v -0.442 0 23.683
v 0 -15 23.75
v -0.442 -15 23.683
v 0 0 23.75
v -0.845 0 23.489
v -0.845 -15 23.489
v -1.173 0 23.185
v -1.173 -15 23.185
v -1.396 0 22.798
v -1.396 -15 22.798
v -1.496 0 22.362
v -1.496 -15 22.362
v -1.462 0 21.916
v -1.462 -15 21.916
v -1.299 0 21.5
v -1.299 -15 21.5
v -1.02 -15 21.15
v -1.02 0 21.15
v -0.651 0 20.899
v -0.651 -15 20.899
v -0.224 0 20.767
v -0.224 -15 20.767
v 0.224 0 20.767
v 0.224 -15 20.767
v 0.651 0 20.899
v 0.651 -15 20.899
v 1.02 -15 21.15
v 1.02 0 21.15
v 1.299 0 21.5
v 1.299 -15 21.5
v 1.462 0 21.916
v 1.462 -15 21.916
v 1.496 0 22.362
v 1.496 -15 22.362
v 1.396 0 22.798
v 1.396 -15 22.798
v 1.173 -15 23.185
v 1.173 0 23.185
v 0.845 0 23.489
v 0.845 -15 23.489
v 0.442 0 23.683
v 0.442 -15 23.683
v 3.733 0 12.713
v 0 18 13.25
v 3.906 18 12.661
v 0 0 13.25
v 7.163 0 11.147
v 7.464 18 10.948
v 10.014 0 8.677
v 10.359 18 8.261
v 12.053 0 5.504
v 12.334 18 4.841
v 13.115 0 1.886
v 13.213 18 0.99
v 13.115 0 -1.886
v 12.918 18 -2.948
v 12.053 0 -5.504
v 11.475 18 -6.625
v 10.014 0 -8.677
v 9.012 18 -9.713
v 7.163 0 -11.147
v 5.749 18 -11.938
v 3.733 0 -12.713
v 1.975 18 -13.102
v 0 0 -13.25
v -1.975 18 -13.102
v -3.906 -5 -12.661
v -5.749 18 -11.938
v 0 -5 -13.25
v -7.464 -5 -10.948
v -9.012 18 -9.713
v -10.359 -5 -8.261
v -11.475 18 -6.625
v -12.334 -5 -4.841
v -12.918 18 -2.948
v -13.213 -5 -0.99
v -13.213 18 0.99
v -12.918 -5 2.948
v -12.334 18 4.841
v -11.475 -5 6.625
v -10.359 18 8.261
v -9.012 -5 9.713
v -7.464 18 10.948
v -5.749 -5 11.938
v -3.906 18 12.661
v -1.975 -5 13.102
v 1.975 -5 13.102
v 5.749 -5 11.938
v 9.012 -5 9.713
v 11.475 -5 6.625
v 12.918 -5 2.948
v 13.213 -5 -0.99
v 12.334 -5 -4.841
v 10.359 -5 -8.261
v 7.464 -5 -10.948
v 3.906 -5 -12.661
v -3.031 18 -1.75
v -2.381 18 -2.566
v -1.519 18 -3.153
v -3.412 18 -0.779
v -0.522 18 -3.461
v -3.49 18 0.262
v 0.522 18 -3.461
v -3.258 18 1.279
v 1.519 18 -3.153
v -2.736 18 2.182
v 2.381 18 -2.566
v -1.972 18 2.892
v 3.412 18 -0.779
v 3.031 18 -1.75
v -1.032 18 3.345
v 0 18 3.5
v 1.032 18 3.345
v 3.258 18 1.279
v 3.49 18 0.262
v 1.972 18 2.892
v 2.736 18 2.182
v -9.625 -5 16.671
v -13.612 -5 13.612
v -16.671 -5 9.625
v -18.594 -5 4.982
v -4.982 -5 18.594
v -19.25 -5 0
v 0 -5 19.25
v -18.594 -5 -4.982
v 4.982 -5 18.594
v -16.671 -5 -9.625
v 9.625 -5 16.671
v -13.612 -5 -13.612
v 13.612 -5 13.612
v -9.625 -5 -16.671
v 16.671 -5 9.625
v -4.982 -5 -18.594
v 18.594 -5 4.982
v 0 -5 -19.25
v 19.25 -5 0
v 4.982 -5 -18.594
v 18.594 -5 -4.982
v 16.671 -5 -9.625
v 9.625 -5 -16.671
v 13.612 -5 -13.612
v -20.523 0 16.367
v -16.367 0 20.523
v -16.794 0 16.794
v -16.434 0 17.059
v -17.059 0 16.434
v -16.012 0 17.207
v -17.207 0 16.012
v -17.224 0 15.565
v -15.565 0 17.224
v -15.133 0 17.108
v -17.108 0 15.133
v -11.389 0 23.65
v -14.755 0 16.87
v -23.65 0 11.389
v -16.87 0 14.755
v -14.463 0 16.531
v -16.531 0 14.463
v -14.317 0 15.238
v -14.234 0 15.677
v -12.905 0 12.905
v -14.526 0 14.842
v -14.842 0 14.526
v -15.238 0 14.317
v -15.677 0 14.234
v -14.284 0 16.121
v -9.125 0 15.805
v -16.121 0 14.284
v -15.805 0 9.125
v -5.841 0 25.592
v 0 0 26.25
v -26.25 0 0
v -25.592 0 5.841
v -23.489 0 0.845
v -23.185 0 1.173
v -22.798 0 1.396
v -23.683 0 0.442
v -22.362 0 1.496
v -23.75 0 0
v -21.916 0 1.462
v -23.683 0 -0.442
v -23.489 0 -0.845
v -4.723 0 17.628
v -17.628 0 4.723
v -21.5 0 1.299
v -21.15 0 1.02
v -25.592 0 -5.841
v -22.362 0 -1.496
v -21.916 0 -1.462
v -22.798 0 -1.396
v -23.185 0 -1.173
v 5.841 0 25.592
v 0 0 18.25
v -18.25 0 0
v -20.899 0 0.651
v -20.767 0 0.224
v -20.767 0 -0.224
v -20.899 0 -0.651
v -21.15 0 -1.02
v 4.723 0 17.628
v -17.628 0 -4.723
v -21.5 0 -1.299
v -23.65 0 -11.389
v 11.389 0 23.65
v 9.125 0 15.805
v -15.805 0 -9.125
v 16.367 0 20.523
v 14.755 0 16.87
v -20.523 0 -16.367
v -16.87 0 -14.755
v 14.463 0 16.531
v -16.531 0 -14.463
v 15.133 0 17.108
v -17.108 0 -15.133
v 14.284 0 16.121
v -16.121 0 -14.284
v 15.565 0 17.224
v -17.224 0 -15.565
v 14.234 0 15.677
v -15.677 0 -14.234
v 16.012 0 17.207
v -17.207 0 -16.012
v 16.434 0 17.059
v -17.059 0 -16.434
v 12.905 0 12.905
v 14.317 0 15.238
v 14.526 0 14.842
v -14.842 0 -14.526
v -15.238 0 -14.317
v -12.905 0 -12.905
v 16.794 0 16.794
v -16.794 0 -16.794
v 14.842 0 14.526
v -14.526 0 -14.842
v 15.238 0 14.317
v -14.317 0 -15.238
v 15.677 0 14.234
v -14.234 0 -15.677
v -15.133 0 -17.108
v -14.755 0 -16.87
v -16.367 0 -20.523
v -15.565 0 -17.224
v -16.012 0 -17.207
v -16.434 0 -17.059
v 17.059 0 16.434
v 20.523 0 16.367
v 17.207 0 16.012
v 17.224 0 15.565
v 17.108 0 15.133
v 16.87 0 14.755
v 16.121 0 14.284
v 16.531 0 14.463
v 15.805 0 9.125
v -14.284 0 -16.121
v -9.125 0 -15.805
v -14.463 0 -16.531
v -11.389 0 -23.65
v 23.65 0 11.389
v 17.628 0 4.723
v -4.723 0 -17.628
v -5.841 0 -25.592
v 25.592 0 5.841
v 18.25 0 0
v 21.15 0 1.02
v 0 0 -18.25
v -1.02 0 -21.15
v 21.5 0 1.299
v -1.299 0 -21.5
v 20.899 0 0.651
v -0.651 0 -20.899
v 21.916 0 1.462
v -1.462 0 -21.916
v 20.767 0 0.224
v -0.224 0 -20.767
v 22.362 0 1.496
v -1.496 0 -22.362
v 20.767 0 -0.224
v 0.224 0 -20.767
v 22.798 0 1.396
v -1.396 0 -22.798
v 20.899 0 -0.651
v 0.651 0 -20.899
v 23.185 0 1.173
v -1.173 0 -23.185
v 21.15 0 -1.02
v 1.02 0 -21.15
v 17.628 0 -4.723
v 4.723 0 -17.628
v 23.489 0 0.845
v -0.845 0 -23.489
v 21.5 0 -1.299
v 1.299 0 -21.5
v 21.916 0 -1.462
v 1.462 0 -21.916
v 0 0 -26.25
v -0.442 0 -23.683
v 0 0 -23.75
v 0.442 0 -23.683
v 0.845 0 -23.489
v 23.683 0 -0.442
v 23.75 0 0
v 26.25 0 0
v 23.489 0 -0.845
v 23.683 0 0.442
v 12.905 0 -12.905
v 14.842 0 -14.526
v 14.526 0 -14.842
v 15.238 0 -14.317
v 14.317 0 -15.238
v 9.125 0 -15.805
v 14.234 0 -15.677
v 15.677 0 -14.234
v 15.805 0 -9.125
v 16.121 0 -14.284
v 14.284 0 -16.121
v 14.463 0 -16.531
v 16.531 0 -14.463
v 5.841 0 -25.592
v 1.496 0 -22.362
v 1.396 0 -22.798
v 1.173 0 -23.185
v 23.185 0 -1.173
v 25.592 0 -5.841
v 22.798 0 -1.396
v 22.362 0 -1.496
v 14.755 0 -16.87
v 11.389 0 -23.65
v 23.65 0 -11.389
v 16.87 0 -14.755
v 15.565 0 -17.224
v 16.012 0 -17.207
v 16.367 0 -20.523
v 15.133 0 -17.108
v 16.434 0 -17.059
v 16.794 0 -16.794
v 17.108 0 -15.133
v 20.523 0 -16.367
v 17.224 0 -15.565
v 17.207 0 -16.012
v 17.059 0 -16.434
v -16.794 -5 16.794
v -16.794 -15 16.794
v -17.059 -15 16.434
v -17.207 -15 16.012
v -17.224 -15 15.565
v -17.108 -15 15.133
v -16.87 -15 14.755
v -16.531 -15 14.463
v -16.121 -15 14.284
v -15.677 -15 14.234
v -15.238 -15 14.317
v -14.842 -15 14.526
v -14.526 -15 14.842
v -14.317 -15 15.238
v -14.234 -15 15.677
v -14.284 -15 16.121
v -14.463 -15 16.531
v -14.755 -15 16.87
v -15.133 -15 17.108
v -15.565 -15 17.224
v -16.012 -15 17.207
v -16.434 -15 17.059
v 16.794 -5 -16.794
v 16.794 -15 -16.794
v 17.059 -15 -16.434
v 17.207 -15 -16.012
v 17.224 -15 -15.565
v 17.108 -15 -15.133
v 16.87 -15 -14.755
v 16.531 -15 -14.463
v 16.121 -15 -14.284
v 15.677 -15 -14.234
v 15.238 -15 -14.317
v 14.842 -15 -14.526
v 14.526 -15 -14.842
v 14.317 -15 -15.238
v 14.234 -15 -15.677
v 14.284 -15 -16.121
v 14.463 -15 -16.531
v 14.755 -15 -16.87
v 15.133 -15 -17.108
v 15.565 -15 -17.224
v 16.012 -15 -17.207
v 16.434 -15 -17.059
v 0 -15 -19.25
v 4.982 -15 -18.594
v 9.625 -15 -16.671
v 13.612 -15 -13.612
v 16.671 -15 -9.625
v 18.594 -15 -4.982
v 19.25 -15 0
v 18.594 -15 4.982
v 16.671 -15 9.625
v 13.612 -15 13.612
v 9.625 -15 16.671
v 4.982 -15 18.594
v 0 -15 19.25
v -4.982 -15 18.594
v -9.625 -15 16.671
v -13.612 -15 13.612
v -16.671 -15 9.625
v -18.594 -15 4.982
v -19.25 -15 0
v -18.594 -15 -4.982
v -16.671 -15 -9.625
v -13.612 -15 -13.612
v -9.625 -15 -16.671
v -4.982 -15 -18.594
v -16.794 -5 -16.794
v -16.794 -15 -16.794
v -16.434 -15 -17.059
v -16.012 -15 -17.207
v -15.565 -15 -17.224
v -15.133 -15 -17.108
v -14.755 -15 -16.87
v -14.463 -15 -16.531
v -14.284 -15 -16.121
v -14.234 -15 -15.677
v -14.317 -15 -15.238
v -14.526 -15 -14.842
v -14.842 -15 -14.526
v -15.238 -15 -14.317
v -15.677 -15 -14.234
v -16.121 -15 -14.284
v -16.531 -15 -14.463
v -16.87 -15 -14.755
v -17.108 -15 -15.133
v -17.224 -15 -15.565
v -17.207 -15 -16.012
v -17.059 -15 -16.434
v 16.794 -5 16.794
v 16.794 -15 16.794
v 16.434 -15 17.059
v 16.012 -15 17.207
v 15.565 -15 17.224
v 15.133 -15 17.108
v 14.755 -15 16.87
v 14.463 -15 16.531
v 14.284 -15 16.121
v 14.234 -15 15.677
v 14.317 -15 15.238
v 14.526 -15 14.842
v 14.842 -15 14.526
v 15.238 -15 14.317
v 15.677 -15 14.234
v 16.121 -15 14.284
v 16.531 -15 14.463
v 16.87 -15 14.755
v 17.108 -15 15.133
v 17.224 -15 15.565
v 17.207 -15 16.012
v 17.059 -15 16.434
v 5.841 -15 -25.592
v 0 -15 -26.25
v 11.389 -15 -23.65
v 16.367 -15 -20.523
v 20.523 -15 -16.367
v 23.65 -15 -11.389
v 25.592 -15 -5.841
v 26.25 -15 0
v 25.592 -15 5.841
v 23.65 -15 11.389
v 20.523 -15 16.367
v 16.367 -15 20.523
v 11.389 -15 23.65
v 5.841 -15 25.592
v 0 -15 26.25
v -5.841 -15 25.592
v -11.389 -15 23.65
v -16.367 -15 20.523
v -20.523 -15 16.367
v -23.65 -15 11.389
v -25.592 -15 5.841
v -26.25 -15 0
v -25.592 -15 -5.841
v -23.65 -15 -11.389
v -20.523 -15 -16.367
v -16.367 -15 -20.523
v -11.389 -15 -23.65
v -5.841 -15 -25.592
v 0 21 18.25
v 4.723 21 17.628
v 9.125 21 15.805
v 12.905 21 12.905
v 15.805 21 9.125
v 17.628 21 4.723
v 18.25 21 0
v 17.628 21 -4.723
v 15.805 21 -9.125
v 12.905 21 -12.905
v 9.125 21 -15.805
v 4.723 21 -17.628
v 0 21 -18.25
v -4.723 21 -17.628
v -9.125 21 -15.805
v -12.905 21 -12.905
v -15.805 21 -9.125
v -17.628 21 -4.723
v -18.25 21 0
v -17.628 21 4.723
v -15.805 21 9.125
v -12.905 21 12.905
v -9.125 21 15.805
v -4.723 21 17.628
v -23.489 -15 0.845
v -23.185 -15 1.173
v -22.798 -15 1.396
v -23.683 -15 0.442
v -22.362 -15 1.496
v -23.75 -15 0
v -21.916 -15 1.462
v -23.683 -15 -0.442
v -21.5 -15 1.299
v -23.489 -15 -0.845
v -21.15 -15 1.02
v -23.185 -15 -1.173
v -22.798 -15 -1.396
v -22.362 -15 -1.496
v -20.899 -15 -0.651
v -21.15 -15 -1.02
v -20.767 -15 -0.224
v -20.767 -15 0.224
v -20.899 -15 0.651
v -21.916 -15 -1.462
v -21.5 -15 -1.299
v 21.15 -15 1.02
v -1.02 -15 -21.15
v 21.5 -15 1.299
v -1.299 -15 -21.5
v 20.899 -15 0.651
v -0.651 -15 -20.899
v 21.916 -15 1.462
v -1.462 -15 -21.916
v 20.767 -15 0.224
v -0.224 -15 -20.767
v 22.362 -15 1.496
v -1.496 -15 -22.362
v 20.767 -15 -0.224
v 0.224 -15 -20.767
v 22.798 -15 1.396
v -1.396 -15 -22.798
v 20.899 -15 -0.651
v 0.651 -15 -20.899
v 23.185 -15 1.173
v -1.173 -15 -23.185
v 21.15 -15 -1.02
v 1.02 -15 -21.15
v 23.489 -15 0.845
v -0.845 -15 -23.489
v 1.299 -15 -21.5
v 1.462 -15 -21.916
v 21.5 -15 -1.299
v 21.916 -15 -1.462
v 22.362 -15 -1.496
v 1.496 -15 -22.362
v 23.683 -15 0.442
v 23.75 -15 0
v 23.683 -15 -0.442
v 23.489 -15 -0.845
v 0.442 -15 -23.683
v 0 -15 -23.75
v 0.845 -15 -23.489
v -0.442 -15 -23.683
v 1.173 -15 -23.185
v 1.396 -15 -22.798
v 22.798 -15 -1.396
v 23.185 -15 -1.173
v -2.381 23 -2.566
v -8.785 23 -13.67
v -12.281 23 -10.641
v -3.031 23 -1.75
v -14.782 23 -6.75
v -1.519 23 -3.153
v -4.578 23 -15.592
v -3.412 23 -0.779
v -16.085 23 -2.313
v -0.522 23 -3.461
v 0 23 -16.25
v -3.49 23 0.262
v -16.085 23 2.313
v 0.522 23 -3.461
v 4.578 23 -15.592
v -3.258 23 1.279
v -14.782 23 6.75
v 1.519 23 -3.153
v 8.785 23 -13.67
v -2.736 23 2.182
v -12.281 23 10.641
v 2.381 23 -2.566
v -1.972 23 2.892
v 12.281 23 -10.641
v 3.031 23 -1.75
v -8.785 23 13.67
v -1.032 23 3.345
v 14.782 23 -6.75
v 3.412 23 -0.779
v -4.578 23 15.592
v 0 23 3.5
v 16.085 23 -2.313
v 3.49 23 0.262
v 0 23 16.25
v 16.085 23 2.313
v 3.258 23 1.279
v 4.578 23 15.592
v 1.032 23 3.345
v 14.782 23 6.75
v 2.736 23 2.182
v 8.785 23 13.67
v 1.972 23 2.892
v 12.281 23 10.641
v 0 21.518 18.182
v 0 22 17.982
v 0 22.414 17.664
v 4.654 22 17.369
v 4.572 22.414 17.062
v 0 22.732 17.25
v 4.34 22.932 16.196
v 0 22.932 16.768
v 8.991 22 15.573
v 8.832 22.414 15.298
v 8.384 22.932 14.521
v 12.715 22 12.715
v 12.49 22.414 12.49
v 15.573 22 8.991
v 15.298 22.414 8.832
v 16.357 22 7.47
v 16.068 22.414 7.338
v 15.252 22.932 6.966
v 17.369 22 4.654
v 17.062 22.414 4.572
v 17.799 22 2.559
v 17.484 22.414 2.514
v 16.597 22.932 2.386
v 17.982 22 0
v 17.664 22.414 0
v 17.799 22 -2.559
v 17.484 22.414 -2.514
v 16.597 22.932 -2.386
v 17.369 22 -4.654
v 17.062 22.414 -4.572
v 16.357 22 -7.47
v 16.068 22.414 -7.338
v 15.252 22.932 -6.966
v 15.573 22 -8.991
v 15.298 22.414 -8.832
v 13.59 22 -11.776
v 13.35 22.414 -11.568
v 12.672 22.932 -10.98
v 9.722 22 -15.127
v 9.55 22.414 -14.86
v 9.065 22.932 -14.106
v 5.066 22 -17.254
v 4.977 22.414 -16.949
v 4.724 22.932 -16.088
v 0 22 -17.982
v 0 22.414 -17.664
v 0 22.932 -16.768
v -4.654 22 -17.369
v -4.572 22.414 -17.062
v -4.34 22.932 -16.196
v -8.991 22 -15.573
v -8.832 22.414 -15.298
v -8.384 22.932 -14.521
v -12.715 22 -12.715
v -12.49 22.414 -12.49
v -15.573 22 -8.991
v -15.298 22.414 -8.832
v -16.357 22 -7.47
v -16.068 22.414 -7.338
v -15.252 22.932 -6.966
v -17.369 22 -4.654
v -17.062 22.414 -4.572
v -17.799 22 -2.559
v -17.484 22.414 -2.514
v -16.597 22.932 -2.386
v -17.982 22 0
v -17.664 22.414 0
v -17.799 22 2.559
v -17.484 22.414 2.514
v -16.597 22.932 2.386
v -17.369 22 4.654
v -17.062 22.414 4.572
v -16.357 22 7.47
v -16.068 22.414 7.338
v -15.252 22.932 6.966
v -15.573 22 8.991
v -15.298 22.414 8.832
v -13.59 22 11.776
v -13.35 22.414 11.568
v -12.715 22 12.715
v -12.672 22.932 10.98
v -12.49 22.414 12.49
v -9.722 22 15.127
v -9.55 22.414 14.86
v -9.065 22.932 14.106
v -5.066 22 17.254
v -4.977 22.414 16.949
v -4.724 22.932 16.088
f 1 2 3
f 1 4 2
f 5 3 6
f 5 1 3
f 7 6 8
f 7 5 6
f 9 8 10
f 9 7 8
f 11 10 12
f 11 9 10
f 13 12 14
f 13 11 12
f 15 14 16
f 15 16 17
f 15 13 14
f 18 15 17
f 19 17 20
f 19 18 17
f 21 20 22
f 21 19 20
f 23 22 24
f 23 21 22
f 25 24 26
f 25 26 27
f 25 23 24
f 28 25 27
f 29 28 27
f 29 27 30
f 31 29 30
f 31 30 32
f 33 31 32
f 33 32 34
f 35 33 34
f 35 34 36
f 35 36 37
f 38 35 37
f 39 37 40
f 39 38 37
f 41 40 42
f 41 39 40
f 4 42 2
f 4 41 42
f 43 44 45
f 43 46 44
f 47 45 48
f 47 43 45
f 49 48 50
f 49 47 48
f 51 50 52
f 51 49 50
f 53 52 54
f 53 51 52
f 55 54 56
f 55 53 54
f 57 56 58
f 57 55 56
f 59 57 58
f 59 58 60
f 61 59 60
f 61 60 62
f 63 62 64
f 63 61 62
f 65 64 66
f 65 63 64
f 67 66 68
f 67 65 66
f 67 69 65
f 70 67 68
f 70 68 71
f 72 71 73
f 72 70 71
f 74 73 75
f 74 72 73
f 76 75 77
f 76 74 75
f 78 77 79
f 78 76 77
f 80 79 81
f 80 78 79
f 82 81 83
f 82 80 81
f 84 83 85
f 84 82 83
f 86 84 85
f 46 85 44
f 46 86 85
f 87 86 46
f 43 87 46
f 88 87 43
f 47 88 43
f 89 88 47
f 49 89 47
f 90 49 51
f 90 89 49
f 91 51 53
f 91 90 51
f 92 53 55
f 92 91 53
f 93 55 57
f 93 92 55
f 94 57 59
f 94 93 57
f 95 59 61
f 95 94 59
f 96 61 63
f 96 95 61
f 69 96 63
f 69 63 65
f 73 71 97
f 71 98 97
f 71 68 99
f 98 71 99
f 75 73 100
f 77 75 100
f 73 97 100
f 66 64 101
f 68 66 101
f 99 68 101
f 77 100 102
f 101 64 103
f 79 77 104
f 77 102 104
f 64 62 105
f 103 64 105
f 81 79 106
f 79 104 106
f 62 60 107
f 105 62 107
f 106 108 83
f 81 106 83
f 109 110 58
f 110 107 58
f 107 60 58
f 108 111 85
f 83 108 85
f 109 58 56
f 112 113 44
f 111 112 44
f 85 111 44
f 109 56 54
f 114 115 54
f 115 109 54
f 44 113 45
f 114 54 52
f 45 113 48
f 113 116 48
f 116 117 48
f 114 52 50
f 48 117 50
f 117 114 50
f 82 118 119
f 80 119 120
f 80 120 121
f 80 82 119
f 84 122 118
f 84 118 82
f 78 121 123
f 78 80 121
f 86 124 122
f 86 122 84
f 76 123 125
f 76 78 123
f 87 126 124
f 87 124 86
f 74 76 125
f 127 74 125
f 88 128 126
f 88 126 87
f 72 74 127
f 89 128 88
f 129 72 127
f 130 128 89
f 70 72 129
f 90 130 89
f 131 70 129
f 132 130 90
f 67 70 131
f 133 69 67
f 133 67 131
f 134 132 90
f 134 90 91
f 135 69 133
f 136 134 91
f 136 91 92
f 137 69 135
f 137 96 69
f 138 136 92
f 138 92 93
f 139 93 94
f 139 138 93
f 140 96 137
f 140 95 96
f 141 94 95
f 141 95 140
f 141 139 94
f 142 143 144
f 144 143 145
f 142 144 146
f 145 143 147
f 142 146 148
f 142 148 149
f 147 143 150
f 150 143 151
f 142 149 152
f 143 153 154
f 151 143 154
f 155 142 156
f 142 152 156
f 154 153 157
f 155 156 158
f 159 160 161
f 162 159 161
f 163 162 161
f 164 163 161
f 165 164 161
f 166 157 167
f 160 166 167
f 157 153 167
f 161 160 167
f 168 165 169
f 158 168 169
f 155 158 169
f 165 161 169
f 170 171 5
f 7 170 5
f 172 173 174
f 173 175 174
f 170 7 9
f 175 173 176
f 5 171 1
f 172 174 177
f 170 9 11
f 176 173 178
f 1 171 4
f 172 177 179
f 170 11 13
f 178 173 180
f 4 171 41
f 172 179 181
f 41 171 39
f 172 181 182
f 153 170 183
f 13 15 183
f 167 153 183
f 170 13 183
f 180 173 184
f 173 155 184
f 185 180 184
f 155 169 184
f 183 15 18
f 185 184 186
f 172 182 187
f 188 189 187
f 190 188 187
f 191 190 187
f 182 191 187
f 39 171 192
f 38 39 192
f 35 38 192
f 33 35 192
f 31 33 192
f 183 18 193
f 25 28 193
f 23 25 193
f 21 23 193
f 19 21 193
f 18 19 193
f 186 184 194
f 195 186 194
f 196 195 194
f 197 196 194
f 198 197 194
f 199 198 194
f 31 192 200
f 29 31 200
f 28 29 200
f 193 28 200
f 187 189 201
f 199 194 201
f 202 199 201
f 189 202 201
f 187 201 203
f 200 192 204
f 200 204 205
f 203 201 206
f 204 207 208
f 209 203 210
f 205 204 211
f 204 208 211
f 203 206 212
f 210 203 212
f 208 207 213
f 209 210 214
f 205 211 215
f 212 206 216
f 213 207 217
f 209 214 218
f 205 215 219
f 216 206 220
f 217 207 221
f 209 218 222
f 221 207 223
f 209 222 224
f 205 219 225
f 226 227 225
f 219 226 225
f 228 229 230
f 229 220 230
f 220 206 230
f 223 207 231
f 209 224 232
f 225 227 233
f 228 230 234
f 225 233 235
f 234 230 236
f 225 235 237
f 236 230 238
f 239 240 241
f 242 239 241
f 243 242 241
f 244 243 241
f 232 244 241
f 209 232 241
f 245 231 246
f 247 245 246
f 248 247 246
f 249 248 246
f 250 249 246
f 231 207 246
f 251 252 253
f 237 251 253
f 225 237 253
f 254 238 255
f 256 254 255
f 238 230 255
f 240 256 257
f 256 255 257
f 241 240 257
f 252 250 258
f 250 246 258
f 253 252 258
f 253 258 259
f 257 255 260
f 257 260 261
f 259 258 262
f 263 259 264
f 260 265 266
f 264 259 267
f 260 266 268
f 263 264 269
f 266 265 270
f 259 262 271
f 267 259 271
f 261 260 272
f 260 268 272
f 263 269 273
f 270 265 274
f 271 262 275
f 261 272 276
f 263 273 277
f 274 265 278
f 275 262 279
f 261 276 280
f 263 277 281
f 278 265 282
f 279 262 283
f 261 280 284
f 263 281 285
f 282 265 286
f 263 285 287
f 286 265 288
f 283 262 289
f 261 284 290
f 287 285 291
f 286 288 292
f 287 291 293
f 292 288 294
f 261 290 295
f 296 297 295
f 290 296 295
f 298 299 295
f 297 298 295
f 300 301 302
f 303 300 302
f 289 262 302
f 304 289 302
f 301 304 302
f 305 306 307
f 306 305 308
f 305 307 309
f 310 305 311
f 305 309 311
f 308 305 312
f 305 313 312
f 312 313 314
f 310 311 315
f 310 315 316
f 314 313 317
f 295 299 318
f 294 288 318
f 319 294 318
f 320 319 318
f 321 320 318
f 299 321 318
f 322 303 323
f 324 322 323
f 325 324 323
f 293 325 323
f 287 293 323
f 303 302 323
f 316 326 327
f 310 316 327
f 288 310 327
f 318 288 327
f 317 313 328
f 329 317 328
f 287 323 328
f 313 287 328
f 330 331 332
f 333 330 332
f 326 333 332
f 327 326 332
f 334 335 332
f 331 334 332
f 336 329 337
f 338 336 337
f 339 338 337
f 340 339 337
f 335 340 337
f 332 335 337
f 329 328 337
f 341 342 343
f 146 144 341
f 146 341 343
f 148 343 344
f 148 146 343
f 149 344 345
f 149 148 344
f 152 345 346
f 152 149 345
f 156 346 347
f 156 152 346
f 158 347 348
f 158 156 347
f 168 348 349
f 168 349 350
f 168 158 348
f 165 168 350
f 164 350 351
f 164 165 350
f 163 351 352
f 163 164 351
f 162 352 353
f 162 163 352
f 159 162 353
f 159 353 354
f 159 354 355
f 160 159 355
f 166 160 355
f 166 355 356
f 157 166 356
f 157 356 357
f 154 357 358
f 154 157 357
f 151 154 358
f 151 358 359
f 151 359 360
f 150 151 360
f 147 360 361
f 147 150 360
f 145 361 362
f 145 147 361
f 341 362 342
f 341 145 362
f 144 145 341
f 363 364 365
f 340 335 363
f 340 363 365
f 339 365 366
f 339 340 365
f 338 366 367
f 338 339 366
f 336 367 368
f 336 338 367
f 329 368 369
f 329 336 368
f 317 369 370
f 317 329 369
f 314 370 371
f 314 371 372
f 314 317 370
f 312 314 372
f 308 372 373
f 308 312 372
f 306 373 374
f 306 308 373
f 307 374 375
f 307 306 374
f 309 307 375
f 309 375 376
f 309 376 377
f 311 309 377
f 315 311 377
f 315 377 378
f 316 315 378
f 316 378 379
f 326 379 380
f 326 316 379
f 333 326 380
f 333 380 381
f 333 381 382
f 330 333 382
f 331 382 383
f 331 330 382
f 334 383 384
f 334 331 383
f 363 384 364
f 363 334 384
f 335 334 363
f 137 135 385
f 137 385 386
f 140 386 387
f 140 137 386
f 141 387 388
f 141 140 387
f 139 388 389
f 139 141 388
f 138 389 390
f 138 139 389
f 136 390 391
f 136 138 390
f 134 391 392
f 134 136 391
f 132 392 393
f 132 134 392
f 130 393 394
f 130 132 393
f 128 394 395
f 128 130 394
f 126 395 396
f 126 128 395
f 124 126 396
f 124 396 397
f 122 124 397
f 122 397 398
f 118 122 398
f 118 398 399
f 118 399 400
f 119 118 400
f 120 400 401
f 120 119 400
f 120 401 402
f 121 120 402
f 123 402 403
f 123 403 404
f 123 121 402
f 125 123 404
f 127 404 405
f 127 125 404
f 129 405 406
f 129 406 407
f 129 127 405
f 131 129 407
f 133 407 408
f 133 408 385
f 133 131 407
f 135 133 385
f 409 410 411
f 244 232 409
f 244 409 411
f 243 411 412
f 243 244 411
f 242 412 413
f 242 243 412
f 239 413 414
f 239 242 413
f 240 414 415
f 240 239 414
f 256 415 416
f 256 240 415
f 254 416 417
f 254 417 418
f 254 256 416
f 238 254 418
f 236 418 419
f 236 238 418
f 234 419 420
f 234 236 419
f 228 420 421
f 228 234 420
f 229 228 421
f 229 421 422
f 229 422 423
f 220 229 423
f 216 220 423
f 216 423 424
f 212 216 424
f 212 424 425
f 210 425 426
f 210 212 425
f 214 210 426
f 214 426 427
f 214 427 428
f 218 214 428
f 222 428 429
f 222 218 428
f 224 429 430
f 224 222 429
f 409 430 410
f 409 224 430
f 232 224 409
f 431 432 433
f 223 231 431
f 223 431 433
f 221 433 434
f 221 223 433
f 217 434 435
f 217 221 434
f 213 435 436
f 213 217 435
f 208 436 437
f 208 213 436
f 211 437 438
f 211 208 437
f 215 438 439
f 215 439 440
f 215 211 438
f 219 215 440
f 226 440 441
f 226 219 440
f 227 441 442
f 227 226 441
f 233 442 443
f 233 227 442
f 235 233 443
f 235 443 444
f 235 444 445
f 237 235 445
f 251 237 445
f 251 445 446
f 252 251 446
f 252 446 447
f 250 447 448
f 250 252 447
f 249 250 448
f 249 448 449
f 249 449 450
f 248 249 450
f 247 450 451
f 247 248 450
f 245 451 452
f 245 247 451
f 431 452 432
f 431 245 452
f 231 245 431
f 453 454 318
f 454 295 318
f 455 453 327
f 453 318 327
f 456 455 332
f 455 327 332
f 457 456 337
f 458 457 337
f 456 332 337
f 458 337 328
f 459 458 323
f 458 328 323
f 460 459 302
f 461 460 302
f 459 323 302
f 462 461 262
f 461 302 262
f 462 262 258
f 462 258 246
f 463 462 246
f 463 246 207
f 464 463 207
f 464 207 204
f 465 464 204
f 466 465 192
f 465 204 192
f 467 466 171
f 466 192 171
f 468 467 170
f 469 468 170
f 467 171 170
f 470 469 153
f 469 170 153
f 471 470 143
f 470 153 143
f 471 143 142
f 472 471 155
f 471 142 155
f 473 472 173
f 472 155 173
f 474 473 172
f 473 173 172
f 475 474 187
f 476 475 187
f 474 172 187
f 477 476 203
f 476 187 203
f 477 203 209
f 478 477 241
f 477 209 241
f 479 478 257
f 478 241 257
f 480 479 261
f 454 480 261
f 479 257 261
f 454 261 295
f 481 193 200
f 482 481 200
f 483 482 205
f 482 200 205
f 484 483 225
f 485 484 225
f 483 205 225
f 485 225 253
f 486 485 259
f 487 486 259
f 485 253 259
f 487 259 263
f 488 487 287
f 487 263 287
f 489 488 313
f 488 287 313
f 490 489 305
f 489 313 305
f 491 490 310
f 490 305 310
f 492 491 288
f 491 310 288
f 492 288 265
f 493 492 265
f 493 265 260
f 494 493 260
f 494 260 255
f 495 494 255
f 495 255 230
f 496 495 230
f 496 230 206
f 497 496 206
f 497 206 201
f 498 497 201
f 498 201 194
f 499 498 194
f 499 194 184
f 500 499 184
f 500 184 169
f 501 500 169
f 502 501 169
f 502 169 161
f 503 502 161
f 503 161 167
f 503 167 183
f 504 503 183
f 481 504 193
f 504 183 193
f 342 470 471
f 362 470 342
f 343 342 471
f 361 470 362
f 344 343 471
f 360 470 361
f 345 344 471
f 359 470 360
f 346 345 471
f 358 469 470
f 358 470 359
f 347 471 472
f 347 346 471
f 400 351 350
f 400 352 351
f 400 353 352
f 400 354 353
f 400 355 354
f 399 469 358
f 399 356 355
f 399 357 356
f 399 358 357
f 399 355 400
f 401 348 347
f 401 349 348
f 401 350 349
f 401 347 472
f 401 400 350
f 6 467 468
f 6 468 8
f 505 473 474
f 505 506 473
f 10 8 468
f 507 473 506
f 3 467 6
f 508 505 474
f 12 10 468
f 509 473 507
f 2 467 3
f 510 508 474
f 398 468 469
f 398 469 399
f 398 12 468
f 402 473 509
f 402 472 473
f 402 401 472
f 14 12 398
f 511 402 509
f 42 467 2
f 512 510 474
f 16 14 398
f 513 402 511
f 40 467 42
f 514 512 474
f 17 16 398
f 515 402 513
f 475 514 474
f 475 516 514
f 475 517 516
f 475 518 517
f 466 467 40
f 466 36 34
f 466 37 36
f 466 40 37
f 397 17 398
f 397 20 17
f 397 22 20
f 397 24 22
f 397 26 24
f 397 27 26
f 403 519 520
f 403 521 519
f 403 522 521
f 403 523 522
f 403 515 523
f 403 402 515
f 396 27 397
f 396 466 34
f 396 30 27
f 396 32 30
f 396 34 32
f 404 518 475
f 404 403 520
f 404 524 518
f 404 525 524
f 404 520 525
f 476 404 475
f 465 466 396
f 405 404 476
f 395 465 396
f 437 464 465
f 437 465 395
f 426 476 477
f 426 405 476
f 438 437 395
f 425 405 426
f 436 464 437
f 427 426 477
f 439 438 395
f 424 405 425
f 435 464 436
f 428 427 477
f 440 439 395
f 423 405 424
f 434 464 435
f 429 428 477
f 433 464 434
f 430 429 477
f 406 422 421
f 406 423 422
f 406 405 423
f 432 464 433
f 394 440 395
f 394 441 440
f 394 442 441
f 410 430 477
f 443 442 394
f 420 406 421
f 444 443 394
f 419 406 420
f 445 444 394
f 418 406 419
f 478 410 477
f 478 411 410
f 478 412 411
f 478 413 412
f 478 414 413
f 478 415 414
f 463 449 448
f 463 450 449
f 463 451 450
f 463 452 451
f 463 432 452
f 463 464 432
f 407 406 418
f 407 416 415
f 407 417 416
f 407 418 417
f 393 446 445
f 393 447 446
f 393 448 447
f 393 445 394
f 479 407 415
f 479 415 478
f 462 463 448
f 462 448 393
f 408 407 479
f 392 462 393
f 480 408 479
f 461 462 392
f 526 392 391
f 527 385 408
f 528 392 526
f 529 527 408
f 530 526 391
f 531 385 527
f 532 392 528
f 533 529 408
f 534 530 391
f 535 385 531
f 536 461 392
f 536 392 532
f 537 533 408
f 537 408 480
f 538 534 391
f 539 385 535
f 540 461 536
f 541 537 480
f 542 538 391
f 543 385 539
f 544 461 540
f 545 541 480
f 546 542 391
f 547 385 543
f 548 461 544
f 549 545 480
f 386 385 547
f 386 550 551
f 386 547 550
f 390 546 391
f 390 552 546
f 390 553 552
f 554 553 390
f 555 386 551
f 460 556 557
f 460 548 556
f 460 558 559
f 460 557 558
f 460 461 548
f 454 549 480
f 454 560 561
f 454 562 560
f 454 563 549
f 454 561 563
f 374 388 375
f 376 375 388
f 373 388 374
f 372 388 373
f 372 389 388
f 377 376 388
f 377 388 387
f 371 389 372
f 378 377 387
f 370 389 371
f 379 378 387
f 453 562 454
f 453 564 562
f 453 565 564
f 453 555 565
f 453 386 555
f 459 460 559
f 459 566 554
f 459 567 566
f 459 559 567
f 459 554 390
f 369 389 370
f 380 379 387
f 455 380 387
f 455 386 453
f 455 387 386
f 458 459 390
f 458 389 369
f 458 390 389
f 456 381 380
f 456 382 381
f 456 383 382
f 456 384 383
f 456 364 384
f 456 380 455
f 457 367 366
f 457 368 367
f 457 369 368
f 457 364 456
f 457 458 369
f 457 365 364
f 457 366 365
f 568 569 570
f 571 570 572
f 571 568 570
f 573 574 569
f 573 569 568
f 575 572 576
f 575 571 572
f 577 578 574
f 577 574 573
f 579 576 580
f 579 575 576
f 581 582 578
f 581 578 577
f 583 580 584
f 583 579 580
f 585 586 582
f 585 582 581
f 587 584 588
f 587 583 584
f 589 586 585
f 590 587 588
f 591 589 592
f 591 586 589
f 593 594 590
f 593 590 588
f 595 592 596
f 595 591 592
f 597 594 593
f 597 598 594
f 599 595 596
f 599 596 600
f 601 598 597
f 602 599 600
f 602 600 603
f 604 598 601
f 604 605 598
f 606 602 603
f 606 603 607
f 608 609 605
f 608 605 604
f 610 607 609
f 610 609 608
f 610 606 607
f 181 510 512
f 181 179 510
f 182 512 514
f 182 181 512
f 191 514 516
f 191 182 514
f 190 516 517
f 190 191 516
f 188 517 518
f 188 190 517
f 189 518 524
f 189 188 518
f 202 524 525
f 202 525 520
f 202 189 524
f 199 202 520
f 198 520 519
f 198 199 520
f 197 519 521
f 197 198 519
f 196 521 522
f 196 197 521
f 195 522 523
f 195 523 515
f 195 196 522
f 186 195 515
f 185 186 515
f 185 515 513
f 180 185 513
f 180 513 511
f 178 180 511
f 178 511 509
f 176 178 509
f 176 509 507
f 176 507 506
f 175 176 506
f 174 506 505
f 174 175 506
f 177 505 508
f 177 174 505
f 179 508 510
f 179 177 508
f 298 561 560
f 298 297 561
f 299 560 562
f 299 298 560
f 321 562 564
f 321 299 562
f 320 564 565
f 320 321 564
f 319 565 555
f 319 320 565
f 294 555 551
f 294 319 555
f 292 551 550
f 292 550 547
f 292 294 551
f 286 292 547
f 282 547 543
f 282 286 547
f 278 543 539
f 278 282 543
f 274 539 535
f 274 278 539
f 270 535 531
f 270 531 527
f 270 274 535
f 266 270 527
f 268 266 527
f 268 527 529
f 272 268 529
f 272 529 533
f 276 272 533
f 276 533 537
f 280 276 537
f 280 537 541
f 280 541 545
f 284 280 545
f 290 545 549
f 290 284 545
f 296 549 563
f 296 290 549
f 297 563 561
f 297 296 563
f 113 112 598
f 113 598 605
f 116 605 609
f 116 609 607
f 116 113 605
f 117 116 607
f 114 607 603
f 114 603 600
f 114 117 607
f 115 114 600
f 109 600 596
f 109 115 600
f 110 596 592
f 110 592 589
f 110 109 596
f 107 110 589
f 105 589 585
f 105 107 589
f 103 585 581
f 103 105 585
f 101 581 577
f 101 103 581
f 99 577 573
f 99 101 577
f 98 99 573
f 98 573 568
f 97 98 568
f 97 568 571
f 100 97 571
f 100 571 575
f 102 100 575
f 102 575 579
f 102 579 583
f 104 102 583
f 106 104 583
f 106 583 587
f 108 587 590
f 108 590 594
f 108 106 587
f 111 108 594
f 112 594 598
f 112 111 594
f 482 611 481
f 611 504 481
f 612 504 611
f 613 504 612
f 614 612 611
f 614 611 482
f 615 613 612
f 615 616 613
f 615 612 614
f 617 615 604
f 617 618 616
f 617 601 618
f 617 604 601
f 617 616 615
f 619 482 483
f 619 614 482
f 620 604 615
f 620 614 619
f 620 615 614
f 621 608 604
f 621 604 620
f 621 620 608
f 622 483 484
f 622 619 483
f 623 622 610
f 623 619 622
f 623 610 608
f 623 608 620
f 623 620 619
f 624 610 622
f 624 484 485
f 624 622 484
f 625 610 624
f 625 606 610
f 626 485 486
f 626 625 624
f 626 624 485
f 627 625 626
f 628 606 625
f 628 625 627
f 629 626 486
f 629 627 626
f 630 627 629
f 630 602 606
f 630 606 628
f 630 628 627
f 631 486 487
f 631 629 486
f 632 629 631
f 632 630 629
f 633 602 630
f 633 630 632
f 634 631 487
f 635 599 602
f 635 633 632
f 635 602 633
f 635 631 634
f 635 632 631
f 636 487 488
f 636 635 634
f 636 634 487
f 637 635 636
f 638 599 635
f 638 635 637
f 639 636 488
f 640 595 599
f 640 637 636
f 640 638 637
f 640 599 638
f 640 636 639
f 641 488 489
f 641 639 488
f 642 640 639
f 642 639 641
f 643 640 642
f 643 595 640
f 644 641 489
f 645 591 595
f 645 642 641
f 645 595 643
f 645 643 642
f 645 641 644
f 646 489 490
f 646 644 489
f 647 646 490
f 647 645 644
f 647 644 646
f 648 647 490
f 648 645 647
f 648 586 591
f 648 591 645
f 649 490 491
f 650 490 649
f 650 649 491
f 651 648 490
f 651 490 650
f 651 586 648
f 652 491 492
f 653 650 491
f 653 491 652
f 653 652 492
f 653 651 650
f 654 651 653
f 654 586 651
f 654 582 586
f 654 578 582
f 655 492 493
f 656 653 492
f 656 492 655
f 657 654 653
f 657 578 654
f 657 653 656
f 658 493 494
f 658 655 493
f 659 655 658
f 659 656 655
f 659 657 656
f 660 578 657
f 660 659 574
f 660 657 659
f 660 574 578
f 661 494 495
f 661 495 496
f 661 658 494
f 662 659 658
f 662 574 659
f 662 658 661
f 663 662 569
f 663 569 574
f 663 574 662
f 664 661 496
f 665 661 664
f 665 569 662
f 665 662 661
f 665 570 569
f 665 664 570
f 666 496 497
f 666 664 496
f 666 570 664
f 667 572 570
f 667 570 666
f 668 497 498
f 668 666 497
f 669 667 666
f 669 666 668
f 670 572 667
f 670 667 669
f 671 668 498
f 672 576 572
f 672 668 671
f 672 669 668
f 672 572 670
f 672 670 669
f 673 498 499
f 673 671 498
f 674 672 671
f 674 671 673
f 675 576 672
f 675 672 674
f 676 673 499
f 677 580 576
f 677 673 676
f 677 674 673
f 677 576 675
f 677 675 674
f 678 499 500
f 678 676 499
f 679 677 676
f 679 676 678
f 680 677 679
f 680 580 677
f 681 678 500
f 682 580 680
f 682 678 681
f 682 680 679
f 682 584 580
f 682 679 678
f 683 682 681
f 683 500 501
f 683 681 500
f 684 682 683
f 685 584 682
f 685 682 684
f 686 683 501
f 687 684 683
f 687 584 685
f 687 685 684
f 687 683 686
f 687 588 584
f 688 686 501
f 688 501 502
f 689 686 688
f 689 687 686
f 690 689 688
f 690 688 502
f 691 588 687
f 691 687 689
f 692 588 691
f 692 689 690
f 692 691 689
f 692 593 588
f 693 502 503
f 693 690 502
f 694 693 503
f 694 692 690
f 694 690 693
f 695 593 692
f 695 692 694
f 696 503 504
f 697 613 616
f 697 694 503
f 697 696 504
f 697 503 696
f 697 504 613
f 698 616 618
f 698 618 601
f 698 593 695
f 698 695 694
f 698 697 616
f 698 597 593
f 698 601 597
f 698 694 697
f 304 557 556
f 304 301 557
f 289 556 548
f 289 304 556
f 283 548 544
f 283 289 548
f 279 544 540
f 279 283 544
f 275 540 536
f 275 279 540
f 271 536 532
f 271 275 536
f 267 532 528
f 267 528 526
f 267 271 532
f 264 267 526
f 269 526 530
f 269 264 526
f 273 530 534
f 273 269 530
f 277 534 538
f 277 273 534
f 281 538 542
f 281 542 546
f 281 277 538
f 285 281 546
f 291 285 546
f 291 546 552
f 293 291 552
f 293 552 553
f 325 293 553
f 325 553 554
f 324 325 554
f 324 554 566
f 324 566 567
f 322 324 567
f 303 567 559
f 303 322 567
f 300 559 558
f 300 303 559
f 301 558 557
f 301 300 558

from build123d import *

# Parameters (mm, degrees)
SKETCH1_R           = 18.25
SKETCH1_R_2         = 13.25
BOSS_EXTRUDE1_DEPTH = 18
SKETCH2_R           = 26.25
SKETCH2_R_2         = 13.25
FLANGE_DEPTH        = 5
CUT_EXTRUDE1_REACH  = 43.257
SKETCH4_R           = 1.5
CIRPATTERN1_COUNT   = 8
SKETCH6_R           = 18.25
SKETCH6_R_2         = 3.5
TOP_DEPTH           = 5
SKETCH7_R           = 26.25
SKETCH7_R_2         = 19.25
SKETCH7_R_3         = 1.5
BOSS_EXTRUDE5_DEPTH = 10
FILLET1_R           = 2


with BuildPart() as part:
    # Sketch1 → Boss-Extrude1 (new body)
    with BuildSketch(Plane(origin=(0, 0, 0), x_dir=(1, 0, 0), z_dir=(0, 1, 0))):
        with Locations(Location((0, 0, 0), (0, 0, 270))):
            Circle(SKETCH1_R)
        with Locations(Location((0, 0, 0), (0, 0, 270))):
            Circle(SKETCH1_R_2, mode=Mode.SUBTRACT)
    extrude(amount=BOSS_EXTRUDE1_DEPTH)

    # Sketch2 → flange (add)
    with BuildSketch(Plane.XZ):
        with Locations(Location((0, 0, 0), (0, 0, 270))):
            Circle(SKETCH2_R)
        with Locations(Location((0, 0, 0), (0, 0, 270))):
            Circle(SKETCH2_R_2, mode=Mode.SUBTRACT)
    extrude(amount=FLANGE_DEPTH)

    # Sketch4 → Cut-Extrude1 (cut, up to next)
    with BuildSketch(Plane(origin=(0, 0, 0), x_dir=(1, 0, 0), z_dir=(0, 1, 0)), mode=Mode.PRIVATE) as cut_extrude1_sk1:
        with Locations(Location((0, -22.25, 0), (0, 0, 270))):
            Circle(SKETCH4_R)
    cut_extrude1_tool1 = extrude(cut_extrude1_sk1.sketch, amount=-CUT_EXTRUDE1_REACH, mode=Mode.PRIVATE) & part.part
    cut_extrude1 = cut_extrude1_tool1.solids().sort_by_distance((0, 0, 22.25))[0]
    add(cut_extrude1, mode=Mode.SUBTRACT)

    # CirPattern1: Cut-Extrude1 ×8 about axis
    cirpattern1_axis = Axis((0, 0, 0), (0, 1, 0))
    for i in range(1, CIRPATTERN1_COUNT):
        add(cut_extrude1.rotate(cirpattern1_axis, i * 360 / CIRPATTERN1_COUNT), mode=Mode.SUBTRACT)

    # Sketch6 → top (add)
    with BuildSketch(Plane(origin=(0, 18, 0), x_dir=(1, 0, 0), z_dir=(0, 1, 0))):
        with Locations(Location((0, 0, 0), (0, 0, 270))):
            Circle(SKETCH6_R)
        with Locations(Location((0, 0, 0), (0, 0, 270))):
            Circle(SKETCH6_R_2, mode=Mode.SUBTRACT)
    extrude(amount=TOP_DEPTH)

    # Sketch7 → Boss-Extrude5 (add)
    with BuildSketch(Plane.XZ.offset(5)):
        with Locations(Location((0, 0, 0), (0, 0, 270))):
            Circle(SKETCH7_R)
        with Locations(Location((0, 0, 0), (0, 0, 270))):
            Circle(SKETCH7_R_2, mode=Mode.SUBTRACT)
        with Locations(Location((-15.733125881, -15.733125881, 0), (0, 0, 225))):
            Circle(SKETCH7_R_3, mode=Mode.SUBTRACT)
        with Locations(Location((15.733125881, -15.733125881, 0), (0, 0, 315))):
            Circle(SKETCH7_R_3, mode=Mode.SUBTRACT)
        with Locations(Location((15.733125881, 15.733125881, 0), (0, 0, 45))):
            Circle(SKETCH7_R_3, mode=Mode.SUBTRACT)
        with Locations(Location((0, 22.25, 0), (0, 0, 90))):
            Circle(SKETCH7_R_3, mode=Mode.SUBTRACT)
        with Locations(Location((-15.733125881, 15.733125881, 0), (0, 0, 135))):
            Circle(SKETCH7_R_3, mode=Mode.SUBTRACT)
        with Locations((22.25, 0)):
            Circle(SKETCH7_R_3, mode=Mode.SUBTRACT)
        with Locations(Location((0, -22.25, 0), (0, 0, 270))):
            Circle(SKETCH7_R_3, mode=Mode.SUBTRACT)
        with Locations(Location((-22.25, 0, 0), (0, 0, 180))):
            Circle(SKETCH7_R_3, mode=Mode.SUBTRACT)
    extrude(amount=BOSS_EXTRUDE5_DEPTH)

    # Fillet1
    fillet1_edges = [part.edges().sort_by_distance(p)[0] for p in [
        (0, 23, -18.25),
    ]]
    fillet(fillet1_edges, radius=FILLET1_R)


solid = part.part
